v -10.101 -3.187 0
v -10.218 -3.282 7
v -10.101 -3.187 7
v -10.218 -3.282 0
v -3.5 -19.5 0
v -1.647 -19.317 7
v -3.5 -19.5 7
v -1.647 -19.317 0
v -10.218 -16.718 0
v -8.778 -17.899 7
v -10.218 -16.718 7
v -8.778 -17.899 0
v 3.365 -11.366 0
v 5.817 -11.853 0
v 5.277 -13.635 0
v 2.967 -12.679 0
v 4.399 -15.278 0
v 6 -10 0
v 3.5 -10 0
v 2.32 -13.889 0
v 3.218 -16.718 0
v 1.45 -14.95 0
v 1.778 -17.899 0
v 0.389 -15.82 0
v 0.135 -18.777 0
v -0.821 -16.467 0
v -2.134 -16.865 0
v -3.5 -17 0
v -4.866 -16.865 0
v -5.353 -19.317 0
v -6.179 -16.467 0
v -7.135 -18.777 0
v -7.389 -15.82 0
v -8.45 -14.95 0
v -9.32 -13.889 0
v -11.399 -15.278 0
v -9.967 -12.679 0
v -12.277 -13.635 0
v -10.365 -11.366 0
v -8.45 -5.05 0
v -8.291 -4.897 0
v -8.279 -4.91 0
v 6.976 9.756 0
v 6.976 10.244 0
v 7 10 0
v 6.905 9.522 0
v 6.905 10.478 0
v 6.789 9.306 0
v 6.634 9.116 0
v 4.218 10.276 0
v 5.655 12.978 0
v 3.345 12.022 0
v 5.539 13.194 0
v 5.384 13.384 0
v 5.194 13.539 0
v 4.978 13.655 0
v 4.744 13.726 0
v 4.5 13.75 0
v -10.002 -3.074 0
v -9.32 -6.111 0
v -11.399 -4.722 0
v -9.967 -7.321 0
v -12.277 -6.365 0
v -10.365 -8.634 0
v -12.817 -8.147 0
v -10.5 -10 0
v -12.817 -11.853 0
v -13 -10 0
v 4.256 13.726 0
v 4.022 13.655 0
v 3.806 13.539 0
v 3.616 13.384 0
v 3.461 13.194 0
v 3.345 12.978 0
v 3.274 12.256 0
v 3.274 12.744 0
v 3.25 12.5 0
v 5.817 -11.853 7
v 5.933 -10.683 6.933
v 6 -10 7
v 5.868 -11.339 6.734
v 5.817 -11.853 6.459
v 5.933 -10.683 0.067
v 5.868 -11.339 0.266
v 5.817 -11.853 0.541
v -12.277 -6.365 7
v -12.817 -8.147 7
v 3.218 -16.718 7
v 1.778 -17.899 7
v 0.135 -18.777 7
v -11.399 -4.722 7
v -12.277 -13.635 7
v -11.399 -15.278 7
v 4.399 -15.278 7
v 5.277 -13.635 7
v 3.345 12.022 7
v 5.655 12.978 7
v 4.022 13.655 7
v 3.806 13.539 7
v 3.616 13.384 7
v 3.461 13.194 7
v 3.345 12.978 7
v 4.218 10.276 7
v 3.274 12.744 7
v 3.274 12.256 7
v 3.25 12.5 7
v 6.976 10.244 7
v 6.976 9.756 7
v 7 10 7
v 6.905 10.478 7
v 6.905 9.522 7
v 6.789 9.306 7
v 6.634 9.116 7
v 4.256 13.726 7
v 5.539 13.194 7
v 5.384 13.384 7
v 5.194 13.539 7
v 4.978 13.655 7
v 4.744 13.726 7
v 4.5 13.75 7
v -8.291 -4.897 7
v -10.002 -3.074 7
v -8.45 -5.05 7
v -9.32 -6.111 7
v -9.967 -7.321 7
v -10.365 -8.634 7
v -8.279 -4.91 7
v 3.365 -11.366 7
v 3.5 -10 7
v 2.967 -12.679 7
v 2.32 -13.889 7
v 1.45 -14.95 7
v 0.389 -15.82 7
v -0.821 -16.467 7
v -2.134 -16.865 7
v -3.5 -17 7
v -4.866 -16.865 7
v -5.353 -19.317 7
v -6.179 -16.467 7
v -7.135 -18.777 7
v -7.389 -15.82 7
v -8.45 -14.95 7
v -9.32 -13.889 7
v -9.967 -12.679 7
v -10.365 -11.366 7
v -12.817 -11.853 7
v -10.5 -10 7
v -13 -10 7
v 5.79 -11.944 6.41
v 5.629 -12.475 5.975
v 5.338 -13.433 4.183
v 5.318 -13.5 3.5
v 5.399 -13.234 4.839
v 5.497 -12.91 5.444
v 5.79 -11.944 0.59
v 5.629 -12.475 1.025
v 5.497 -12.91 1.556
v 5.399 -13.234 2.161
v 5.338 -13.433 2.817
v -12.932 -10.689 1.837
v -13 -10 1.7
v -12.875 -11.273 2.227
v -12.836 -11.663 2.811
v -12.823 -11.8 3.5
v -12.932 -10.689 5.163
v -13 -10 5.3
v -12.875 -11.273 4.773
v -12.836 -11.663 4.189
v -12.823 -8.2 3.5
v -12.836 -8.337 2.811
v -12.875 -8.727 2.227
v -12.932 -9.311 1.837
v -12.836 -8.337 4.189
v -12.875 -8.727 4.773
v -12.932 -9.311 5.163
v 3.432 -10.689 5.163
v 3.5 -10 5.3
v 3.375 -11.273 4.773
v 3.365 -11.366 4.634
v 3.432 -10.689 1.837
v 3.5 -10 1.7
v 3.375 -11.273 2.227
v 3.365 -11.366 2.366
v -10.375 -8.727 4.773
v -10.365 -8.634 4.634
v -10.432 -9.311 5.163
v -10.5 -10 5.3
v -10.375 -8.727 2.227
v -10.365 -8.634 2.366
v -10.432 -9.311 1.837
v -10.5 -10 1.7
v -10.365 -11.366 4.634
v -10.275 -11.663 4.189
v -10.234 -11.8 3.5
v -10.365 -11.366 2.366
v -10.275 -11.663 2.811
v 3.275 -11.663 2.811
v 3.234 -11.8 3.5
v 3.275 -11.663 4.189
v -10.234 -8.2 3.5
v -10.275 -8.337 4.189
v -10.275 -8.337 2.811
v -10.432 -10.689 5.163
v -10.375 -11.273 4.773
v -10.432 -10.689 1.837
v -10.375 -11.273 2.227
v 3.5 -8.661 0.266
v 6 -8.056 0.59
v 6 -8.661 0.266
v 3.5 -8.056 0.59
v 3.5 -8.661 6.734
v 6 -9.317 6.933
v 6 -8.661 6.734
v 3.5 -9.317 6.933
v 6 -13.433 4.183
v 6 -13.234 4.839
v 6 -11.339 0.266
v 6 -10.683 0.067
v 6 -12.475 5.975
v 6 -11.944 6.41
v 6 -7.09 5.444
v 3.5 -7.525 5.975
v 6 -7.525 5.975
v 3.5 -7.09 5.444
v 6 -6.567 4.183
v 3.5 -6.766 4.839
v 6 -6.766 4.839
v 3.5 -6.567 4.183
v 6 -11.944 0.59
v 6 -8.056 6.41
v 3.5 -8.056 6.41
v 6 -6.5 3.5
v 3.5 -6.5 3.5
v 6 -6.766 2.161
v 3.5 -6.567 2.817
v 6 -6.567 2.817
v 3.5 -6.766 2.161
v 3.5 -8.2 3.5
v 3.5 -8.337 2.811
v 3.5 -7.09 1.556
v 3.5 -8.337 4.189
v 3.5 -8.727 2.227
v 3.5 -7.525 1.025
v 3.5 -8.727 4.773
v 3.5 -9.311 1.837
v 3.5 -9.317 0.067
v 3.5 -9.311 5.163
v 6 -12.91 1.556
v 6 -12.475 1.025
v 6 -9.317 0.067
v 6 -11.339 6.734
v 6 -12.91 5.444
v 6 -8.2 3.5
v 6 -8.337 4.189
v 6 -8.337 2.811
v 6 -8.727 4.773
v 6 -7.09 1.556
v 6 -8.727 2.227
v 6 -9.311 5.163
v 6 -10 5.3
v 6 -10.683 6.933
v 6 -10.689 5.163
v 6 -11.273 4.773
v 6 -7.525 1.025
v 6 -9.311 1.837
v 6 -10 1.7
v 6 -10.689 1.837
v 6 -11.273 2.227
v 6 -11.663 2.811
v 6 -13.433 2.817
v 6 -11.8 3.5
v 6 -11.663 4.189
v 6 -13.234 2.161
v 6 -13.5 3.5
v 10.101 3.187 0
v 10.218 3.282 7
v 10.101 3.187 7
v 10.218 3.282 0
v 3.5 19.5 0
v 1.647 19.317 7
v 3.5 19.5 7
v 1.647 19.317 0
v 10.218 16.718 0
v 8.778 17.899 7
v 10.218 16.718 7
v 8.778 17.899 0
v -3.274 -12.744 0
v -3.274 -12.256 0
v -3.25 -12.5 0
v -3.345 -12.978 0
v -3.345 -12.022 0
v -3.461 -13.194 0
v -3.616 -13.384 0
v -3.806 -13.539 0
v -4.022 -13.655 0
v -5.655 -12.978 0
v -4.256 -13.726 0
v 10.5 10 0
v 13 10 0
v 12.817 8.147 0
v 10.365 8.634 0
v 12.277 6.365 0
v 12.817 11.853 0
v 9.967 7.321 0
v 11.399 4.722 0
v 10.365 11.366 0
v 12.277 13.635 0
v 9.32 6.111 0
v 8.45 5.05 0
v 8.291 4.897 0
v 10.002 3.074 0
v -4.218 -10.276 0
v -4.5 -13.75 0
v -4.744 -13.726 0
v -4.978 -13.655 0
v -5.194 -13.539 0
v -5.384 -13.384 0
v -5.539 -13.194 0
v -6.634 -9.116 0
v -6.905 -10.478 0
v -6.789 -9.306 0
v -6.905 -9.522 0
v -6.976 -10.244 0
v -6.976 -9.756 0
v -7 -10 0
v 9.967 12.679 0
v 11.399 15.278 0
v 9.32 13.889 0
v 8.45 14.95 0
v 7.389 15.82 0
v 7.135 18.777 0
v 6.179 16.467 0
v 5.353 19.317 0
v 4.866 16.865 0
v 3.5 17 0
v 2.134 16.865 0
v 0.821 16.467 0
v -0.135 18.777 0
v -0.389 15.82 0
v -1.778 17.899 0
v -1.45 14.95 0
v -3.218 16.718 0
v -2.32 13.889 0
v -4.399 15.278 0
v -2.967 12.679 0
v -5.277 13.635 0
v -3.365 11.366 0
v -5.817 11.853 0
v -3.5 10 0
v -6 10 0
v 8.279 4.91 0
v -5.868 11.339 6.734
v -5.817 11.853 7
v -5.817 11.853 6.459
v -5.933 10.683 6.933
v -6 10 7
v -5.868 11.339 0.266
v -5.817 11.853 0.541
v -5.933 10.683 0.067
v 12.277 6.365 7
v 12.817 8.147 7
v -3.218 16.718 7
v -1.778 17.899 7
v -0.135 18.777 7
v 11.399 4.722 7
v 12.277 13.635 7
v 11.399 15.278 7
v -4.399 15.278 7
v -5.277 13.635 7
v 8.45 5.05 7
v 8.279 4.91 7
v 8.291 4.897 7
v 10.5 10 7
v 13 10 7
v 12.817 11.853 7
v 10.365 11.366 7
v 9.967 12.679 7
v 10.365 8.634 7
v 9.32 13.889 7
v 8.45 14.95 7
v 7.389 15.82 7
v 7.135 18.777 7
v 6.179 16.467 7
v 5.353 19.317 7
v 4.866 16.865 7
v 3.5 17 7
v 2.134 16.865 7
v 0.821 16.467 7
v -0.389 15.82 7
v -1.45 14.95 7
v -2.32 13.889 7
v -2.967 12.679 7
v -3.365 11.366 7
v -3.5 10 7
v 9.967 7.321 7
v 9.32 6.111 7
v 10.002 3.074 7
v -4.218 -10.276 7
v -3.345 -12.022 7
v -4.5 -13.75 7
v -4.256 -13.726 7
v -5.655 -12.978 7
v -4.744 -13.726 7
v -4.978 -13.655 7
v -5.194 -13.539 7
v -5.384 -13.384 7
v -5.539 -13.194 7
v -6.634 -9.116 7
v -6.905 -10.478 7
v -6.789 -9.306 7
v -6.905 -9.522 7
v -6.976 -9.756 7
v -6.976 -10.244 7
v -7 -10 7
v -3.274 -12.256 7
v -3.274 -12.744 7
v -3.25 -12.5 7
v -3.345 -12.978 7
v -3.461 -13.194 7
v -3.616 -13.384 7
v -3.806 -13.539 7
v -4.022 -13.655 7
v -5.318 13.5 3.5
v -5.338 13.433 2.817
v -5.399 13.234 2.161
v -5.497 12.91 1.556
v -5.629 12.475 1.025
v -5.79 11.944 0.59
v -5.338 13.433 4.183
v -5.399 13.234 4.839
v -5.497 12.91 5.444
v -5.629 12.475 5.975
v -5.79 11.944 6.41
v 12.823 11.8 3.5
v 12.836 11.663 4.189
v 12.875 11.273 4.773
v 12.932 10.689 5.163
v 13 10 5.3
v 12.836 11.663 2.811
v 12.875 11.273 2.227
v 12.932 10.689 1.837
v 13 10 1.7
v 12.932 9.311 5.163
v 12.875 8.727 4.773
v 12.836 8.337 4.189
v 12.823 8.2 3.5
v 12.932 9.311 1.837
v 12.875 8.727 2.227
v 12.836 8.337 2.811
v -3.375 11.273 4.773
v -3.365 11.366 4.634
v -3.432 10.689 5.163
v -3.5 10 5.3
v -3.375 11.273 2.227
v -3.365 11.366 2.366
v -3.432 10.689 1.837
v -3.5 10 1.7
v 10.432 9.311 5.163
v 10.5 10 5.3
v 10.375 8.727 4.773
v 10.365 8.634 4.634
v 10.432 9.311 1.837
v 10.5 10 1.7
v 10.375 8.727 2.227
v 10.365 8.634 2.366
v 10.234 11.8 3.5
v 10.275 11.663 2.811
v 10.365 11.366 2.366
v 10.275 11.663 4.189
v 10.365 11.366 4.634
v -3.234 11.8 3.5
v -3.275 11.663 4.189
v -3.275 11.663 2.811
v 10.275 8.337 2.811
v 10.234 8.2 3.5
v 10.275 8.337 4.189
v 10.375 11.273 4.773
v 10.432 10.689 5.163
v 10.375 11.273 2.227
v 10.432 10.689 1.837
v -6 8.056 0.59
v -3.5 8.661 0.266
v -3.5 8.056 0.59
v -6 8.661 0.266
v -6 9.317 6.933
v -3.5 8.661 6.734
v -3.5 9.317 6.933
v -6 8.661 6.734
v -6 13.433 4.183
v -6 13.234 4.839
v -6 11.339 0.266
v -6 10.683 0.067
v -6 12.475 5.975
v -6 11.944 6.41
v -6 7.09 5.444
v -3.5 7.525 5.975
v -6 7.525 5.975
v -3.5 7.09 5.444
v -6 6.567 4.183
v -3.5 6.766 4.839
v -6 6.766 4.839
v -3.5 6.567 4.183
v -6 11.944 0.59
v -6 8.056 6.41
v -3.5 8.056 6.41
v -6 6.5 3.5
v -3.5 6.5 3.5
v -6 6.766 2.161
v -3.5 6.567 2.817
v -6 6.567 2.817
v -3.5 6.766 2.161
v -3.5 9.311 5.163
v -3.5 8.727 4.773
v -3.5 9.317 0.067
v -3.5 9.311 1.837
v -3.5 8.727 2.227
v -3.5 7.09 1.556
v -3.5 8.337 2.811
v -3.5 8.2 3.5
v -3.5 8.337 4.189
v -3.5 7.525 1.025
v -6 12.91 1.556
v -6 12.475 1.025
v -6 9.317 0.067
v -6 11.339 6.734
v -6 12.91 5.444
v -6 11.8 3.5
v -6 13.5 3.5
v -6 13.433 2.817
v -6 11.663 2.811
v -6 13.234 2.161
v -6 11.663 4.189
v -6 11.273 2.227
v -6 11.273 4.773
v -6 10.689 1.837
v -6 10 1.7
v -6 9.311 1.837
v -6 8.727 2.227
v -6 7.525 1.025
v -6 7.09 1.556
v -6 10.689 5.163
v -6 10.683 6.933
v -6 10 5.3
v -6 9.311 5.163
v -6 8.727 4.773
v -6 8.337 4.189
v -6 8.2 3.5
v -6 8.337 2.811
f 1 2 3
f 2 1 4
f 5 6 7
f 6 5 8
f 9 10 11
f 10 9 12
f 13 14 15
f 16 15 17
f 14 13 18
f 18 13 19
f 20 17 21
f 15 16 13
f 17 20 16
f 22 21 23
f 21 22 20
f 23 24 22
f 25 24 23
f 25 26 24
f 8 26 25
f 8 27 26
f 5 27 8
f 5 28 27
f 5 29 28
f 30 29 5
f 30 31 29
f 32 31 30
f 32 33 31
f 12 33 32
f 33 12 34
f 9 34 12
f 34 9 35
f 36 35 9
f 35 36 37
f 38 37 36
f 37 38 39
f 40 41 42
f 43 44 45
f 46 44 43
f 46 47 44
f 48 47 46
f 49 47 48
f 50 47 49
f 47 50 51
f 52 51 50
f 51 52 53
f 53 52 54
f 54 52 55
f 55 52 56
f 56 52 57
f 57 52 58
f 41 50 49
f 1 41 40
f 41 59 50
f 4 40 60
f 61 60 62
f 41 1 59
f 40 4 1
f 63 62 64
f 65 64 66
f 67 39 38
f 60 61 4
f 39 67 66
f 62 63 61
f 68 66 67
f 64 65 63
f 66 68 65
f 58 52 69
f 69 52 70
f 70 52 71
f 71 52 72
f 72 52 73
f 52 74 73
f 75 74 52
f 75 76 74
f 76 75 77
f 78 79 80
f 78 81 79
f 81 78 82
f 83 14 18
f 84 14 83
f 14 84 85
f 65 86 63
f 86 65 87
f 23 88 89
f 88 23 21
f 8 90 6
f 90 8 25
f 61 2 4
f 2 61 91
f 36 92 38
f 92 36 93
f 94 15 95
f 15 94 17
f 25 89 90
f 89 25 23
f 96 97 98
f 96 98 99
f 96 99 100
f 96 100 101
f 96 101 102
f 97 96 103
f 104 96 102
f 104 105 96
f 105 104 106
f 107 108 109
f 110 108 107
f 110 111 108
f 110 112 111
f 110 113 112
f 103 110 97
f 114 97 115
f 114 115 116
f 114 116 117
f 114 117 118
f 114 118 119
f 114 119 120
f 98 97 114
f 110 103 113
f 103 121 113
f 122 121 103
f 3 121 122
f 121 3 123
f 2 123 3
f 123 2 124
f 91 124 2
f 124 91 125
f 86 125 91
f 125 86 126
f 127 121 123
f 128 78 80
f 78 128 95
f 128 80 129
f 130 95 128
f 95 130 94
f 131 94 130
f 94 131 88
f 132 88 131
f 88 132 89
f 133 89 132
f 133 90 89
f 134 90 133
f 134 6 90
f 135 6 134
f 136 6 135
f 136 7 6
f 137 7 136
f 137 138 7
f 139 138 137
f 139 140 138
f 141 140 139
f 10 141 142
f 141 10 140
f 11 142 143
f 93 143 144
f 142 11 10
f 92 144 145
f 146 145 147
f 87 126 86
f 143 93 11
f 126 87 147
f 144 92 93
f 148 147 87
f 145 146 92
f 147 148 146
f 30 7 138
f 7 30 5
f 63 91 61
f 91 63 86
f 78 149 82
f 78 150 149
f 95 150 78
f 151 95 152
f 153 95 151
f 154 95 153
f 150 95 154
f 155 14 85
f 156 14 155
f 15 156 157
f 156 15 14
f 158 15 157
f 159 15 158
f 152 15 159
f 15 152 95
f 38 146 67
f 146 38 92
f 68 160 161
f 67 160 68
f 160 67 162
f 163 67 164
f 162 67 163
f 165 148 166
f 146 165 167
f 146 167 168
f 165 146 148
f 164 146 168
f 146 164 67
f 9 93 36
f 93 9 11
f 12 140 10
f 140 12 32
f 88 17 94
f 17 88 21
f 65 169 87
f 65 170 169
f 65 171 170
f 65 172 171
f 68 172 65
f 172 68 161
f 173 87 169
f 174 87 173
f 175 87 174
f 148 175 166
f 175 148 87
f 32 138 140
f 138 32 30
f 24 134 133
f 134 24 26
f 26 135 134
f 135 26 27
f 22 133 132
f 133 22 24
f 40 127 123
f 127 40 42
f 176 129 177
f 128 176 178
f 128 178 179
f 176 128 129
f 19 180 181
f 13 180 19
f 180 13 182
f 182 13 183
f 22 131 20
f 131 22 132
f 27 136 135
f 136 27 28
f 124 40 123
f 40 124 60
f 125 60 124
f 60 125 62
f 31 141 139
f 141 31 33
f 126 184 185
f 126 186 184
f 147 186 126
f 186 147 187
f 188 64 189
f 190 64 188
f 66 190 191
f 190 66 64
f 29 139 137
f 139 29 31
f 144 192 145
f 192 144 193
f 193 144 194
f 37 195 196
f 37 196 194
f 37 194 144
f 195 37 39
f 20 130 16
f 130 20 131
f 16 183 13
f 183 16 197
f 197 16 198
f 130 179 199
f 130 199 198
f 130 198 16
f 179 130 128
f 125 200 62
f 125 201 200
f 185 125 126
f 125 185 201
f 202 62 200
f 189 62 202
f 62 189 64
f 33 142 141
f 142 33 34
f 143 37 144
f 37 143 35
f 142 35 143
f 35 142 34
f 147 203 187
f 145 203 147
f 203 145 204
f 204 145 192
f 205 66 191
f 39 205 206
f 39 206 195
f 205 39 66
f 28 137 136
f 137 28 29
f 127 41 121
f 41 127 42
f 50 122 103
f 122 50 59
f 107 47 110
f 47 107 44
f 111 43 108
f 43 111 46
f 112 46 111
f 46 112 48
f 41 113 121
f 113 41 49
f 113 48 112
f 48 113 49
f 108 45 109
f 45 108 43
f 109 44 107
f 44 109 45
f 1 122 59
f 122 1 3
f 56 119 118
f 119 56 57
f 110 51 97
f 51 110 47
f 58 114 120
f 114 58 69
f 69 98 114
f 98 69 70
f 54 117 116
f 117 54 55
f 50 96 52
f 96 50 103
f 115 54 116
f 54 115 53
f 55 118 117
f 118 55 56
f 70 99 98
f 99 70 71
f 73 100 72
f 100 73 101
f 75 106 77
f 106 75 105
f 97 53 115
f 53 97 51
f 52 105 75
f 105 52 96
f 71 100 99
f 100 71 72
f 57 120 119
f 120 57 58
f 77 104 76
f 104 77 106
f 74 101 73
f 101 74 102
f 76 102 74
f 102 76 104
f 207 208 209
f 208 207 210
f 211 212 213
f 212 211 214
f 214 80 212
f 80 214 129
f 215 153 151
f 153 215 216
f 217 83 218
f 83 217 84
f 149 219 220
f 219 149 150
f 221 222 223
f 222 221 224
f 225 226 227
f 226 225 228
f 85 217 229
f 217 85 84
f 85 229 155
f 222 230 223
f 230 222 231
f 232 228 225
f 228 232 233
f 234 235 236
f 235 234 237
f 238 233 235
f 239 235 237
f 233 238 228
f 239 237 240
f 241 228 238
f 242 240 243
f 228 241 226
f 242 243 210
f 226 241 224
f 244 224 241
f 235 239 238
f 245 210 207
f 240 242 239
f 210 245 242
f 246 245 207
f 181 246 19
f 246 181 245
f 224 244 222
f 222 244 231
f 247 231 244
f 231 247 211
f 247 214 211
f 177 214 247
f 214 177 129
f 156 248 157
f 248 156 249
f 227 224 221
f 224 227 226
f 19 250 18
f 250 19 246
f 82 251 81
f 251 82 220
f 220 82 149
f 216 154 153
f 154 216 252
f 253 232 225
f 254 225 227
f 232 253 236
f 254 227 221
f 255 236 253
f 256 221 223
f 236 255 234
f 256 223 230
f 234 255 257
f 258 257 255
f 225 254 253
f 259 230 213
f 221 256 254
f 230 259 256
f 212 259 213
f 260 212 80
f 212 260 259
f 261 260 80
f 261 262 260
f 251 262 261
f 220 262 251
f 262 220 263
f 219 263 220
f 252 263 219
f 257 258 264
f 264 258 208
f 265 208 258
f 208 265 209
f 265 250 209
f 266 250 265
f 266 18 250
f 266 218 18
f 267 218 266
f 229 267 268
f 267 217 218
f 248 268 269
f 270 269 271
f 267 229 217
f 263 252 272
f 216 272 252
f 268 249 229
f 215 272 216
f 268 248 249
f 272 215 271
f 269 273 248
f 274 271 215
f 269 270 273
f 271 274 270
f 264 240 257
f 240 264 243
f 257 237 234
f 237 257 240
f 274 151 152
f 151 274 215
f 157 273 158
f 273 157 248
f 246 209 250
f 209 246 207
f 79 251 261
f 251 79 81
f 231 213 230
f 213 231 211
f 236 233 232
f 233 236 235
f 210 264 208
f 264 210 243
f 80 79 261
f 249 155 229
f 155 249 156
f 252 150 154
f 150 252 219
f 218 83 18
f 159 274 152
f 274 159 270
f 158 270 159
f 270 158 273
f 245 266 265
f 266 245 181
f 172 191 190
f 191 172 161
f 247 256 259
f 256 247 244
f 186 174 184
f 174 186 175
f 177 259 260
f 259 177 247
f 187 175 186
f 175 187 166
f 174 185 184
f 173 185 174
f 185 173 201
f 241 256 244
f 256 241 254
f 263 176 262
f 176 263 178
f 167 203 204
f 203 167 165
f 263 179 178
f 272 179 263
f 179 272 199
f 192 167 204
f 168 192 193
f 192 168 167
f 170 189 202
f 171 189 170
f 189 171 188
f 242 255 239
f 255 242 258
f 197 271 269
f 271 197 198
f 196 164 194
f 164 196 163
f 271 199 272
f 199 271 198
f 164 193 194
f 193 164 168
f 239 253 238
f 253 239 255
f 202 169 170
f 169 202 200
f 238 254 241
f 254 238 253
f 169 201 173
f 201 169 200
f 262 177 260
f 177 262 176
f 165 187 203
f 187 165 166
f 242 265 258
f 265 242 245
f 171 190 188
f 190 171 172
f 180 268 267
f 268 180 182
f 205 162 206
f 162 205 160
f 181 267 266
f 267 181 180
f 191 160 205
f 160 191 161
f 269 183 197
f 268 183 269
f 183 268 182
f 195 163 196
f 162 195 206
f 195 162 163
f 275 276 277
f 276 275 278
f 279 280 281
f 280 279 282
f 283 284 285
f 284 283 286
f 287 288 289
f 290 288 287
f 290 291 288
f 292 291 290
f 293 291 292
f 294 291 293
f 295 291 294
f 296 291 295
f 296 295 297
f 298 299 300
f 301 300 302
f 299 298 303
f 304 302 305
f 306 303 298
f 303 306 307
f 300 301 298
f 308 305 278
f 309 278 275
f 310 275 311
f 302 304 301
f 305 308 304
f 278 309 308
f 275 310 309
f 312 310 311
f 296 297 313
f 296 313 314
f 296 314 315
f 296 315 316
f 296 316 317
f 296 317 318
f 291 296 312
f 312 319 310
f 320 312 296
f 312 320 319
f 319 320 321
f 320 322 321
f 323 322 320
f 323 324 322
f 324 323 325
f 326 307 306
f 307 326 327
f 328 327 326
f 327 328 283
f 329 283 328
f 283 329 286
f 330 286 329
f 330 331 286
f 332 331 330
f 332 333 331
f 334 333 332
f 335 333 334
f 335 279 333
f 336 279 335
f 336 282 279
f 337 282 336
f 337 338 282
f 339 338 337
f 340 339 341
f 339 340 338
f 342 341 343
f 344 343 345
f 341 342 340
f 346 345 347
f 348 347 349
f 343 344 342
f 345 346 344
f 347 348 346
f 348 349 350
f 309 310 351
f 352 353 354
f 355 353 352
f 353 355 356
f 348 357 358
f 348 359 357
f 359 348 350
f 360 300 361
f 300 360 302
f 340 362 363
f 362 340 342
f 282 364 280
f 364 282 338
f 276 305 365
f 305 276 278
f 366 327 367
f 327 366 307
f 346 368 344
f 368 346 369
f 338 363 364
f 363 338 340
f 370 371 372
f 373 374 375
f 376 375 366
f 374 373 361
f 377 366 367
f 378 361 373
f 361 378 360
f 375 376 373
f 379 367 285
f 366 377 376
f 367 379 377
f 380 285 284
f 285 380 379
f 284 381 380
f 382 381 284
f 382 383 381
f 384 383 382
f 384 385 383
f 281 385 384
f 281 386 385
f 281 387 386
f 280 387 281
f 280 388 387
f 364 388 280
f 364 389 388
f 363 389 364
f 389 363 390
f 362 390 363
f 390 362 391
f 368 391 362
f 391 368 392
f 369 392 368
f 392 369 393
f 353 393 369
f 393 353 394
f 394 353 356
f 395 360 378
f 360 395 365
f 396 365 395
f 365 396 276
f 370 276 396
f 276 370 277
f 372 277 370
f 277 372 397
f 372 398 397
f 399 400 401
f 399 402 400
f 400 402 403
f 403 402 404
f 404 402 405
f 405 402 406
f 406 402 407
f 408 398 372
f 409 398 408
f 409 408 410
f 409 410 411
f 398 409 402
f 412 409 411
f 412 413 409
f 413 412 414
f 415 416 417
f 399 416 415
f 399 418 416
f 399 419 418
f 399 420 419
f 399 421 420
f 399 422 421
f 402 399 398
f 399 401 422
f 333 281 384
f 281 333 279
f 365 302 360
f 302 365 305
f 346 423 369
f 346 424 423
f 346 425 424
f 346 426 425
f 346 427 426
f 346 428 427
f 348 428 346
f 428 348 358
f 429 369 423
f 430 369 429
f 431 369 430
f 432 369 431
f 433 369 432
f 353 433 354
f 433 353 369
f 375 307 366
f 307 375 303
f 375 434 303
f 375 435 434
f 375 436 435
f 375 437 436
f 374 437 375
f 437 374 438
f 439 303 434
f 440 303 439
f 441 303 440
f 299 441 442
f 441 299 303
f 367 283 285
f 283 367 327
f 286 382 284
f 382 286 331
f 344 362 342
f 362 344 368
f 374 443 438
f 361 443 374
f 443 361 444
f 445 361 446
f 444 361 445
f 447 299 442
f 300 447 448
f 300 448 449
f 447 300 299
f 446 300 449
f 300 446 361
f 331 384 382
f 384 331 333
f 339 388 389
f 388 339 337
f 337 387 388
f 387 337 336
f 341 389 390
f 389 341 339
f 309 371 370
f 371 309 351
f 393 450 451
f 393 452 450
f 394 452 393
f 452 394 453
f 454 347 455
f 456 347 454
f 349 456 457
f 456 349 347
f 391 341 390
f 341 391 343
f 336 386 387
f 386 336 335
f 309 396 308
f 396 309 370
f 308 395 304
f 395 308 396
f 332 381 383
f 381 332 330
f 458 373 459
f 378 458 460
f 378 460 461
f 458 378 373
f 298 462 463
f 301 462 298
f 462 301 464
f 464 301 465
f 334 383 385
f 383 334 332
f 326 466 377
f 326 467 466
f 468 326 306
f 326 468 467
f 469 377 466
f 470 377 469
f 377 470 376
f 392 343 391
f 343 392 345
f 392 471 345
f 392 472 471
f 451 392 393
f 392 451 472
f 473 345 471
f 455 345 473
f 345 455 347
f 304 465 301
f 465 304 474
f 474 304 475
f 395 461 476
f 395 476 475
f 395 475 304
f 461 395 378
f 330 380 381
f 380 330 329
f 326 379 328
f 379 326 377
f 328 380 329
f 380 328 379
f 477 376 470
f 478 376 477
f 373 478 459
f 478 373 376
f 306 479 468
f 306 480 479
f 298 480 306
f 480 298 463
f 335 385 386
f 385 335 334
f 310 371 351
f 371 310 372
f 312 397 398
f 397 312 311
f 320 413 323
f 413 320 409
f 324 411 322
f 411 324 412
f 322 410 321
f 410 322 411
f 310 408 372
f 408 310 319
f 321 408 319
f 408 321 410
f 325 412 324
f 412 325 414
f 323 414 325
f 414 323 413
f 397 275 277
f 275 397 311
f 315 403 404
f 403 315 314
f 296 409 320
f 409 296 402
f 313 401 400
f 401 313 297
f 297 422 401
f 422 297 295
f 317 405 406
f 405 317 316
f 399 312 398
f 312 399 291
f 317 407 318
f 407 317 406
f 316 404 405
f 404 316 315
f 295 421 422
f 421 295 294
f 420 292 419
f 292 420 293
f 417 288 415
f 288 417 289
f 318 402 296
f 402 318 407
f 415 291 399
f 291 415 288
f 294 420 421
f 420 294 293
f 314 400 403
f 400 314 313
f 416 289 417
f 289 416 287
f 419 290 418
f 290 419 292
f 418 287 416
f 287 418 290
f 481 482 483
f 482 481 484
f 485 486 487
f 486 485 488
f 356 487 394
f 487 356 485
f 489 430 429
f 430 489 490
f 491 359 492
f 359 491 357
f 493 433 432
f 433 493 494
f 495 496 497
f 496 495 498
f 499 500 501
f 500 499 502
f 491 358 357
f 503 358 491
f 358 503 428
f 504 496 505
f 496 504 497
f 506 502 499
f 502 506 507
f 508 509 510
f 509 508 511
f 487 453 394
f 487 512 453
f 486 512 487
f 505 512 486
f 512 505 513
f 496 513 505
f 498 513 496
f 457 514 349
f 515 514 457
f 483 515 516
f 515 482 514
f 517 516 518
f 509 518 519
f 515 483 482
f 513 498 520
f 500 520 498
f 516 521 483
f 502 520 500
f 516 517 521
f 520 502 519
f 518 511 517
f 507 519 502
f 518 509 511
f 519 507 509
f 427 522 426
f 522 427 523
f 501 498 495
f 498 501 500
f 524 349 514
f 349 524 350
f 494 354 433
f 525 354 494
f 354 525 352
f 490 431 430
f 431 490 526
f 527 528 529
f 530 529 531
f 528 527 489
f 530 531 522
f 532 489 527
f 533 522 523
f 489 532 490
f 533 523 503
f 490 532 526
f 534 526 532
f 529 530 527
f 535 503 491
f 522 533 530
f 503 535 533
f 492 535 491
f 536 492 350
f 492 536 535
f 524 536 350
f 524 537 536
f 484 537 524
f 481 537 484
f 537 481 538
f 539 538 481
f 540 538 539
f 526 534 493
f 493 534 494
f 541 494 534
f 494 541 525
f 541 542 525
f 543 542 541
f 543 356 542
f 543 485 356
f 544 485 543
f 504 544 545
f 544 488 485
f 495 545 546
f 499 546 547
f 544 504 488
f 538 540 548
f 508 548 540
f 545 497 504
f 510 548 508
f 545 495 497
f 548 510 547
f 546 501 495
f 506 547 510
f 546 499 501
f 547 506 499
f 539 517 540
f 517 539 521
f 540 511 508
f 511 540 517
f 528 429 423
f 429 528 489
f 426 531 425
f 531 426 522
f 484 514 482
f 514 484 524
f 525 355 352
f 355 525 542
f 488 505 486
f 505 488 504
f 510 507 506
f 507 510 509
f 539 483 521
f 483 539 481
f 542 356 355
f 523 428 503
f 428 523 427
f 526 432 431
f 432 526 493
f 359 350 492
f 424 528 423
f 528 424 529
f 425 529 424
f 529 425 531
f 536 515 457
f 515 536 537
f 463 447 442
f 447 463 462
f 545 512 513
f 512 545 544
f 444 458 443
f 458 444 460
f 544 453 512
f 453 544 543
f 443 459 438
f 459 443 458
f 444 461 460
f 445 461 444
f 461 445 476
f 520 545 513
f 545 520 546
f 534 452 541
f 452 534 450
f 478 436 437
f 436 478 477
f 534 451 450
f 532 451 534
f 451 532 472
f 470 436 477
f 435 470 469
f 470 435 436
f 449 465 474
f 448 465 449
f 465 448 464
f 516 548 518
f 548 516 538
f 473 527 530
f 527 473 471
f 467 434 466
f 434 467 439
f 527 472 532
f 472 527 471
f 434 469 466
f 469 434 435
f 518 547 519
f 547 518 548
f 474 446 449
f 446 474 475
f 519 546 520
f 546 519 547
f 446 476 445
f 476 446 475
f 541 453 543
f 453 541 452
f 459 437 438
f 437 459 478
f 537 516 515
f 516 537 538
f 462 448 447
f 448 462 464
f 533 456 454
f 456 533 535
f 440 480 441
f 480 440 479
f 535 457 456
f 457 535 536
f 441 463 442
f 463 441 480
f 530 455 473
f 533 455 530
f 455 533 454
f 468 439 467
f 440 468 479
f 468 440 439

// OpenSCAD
/******************************************************************
*                                                                 *
* OpenFlexure Microscope: Optics unit                             *
*                                                                 *
* This is part of the OpenFlexure microscope, an open-source      *
* microscope and 3-axis translation stage.  It gets really good   *
* precision over a ~10mm range, by using plastic flexure          *
* mechanisms.                                                     *
*                                                                 *
* (c) Richard Bowman, January 2016                                *
* Released under the CERN Open Hardware License                   *
*                                                                 *
******************************************************************/


use <./libs/utilities.scad>

//this is for mini culture plates, 39mm outer diameter and 12.4mm high
sample=[0,19/2,12.4-1.5-9]; //position of clamping point relative to bolt

$fn=32;


module sample_clip(sample,t=2.5,w=6,roc=-1,slope=30){
    roc = roc>0 ? roc : sample.z/2 + sample.y*sin(slope) - t/2; //radius of curvature
    a = sqrt(pow(sample.y, 2) + pow(sample.z - roc - t/2, 2));
      //a is the distance from the contact-point cylinder to the
      //centre of the curved part
    angle = acos( (roc + t/2) / a ) + atan((sample.z - roc - t/2)/sample.y); //angle through which we must rotate the join between
    //curved part and straight part
    echo("angle set to:",angle);
    /*angle = 75; //angle of straight part to the vertical
    roc =*/
    difference(){
        union(){
            //anchor to stage
            cylinder(r=w/2,h=t);

            translate([0,0,roc+t]) rotate([0,90,0]) difference(){
                cylinder(r=roc+t,h=w,center=true);
                cylinder(r=roc,h=999,center=true);
                translate([0,0,-99]) rotate(0) cube([999,999,999]);
                translate([0,0,-99]) rotate(angle) cube([999,999,999]);
            }
            sequential_hull(){
                translate([0,0,roc+t]) rotate([0,90,0]) rotate(angle) translate([0,roc+t/2,0]) cylinder(r=t/2,h=w,center=true);
                translate([0,sample.y,sample.z+t/2]) rotate([0,90,0]) cylinder(r=t/2,h=w,center=true);
                translate([0,sample.y+t,sample.z+t]) rotate([0,90,0]) cylinder(r=t/2,h=w,center=true);
            }

        }
        cylinder(r=3/2*1.2,h=999,center=true,$fn=16);
    }
}


//this is for mini culture plates, 39mm outer diameter and 12.4mm high
//sample_clip([0,19/2+3,12.4-1.5],slope=7.5); //mini culture dish

//for a standard microscope slide, use [0,20,0] to clamp from both holes next to one leg
union( ) for(a=[0,180]) rotate([0,-90,a]){
    translate([7/2,-10,-7+1]) sample_clip([0,20,-1], w=7, roc=7); //microscope slide
}
